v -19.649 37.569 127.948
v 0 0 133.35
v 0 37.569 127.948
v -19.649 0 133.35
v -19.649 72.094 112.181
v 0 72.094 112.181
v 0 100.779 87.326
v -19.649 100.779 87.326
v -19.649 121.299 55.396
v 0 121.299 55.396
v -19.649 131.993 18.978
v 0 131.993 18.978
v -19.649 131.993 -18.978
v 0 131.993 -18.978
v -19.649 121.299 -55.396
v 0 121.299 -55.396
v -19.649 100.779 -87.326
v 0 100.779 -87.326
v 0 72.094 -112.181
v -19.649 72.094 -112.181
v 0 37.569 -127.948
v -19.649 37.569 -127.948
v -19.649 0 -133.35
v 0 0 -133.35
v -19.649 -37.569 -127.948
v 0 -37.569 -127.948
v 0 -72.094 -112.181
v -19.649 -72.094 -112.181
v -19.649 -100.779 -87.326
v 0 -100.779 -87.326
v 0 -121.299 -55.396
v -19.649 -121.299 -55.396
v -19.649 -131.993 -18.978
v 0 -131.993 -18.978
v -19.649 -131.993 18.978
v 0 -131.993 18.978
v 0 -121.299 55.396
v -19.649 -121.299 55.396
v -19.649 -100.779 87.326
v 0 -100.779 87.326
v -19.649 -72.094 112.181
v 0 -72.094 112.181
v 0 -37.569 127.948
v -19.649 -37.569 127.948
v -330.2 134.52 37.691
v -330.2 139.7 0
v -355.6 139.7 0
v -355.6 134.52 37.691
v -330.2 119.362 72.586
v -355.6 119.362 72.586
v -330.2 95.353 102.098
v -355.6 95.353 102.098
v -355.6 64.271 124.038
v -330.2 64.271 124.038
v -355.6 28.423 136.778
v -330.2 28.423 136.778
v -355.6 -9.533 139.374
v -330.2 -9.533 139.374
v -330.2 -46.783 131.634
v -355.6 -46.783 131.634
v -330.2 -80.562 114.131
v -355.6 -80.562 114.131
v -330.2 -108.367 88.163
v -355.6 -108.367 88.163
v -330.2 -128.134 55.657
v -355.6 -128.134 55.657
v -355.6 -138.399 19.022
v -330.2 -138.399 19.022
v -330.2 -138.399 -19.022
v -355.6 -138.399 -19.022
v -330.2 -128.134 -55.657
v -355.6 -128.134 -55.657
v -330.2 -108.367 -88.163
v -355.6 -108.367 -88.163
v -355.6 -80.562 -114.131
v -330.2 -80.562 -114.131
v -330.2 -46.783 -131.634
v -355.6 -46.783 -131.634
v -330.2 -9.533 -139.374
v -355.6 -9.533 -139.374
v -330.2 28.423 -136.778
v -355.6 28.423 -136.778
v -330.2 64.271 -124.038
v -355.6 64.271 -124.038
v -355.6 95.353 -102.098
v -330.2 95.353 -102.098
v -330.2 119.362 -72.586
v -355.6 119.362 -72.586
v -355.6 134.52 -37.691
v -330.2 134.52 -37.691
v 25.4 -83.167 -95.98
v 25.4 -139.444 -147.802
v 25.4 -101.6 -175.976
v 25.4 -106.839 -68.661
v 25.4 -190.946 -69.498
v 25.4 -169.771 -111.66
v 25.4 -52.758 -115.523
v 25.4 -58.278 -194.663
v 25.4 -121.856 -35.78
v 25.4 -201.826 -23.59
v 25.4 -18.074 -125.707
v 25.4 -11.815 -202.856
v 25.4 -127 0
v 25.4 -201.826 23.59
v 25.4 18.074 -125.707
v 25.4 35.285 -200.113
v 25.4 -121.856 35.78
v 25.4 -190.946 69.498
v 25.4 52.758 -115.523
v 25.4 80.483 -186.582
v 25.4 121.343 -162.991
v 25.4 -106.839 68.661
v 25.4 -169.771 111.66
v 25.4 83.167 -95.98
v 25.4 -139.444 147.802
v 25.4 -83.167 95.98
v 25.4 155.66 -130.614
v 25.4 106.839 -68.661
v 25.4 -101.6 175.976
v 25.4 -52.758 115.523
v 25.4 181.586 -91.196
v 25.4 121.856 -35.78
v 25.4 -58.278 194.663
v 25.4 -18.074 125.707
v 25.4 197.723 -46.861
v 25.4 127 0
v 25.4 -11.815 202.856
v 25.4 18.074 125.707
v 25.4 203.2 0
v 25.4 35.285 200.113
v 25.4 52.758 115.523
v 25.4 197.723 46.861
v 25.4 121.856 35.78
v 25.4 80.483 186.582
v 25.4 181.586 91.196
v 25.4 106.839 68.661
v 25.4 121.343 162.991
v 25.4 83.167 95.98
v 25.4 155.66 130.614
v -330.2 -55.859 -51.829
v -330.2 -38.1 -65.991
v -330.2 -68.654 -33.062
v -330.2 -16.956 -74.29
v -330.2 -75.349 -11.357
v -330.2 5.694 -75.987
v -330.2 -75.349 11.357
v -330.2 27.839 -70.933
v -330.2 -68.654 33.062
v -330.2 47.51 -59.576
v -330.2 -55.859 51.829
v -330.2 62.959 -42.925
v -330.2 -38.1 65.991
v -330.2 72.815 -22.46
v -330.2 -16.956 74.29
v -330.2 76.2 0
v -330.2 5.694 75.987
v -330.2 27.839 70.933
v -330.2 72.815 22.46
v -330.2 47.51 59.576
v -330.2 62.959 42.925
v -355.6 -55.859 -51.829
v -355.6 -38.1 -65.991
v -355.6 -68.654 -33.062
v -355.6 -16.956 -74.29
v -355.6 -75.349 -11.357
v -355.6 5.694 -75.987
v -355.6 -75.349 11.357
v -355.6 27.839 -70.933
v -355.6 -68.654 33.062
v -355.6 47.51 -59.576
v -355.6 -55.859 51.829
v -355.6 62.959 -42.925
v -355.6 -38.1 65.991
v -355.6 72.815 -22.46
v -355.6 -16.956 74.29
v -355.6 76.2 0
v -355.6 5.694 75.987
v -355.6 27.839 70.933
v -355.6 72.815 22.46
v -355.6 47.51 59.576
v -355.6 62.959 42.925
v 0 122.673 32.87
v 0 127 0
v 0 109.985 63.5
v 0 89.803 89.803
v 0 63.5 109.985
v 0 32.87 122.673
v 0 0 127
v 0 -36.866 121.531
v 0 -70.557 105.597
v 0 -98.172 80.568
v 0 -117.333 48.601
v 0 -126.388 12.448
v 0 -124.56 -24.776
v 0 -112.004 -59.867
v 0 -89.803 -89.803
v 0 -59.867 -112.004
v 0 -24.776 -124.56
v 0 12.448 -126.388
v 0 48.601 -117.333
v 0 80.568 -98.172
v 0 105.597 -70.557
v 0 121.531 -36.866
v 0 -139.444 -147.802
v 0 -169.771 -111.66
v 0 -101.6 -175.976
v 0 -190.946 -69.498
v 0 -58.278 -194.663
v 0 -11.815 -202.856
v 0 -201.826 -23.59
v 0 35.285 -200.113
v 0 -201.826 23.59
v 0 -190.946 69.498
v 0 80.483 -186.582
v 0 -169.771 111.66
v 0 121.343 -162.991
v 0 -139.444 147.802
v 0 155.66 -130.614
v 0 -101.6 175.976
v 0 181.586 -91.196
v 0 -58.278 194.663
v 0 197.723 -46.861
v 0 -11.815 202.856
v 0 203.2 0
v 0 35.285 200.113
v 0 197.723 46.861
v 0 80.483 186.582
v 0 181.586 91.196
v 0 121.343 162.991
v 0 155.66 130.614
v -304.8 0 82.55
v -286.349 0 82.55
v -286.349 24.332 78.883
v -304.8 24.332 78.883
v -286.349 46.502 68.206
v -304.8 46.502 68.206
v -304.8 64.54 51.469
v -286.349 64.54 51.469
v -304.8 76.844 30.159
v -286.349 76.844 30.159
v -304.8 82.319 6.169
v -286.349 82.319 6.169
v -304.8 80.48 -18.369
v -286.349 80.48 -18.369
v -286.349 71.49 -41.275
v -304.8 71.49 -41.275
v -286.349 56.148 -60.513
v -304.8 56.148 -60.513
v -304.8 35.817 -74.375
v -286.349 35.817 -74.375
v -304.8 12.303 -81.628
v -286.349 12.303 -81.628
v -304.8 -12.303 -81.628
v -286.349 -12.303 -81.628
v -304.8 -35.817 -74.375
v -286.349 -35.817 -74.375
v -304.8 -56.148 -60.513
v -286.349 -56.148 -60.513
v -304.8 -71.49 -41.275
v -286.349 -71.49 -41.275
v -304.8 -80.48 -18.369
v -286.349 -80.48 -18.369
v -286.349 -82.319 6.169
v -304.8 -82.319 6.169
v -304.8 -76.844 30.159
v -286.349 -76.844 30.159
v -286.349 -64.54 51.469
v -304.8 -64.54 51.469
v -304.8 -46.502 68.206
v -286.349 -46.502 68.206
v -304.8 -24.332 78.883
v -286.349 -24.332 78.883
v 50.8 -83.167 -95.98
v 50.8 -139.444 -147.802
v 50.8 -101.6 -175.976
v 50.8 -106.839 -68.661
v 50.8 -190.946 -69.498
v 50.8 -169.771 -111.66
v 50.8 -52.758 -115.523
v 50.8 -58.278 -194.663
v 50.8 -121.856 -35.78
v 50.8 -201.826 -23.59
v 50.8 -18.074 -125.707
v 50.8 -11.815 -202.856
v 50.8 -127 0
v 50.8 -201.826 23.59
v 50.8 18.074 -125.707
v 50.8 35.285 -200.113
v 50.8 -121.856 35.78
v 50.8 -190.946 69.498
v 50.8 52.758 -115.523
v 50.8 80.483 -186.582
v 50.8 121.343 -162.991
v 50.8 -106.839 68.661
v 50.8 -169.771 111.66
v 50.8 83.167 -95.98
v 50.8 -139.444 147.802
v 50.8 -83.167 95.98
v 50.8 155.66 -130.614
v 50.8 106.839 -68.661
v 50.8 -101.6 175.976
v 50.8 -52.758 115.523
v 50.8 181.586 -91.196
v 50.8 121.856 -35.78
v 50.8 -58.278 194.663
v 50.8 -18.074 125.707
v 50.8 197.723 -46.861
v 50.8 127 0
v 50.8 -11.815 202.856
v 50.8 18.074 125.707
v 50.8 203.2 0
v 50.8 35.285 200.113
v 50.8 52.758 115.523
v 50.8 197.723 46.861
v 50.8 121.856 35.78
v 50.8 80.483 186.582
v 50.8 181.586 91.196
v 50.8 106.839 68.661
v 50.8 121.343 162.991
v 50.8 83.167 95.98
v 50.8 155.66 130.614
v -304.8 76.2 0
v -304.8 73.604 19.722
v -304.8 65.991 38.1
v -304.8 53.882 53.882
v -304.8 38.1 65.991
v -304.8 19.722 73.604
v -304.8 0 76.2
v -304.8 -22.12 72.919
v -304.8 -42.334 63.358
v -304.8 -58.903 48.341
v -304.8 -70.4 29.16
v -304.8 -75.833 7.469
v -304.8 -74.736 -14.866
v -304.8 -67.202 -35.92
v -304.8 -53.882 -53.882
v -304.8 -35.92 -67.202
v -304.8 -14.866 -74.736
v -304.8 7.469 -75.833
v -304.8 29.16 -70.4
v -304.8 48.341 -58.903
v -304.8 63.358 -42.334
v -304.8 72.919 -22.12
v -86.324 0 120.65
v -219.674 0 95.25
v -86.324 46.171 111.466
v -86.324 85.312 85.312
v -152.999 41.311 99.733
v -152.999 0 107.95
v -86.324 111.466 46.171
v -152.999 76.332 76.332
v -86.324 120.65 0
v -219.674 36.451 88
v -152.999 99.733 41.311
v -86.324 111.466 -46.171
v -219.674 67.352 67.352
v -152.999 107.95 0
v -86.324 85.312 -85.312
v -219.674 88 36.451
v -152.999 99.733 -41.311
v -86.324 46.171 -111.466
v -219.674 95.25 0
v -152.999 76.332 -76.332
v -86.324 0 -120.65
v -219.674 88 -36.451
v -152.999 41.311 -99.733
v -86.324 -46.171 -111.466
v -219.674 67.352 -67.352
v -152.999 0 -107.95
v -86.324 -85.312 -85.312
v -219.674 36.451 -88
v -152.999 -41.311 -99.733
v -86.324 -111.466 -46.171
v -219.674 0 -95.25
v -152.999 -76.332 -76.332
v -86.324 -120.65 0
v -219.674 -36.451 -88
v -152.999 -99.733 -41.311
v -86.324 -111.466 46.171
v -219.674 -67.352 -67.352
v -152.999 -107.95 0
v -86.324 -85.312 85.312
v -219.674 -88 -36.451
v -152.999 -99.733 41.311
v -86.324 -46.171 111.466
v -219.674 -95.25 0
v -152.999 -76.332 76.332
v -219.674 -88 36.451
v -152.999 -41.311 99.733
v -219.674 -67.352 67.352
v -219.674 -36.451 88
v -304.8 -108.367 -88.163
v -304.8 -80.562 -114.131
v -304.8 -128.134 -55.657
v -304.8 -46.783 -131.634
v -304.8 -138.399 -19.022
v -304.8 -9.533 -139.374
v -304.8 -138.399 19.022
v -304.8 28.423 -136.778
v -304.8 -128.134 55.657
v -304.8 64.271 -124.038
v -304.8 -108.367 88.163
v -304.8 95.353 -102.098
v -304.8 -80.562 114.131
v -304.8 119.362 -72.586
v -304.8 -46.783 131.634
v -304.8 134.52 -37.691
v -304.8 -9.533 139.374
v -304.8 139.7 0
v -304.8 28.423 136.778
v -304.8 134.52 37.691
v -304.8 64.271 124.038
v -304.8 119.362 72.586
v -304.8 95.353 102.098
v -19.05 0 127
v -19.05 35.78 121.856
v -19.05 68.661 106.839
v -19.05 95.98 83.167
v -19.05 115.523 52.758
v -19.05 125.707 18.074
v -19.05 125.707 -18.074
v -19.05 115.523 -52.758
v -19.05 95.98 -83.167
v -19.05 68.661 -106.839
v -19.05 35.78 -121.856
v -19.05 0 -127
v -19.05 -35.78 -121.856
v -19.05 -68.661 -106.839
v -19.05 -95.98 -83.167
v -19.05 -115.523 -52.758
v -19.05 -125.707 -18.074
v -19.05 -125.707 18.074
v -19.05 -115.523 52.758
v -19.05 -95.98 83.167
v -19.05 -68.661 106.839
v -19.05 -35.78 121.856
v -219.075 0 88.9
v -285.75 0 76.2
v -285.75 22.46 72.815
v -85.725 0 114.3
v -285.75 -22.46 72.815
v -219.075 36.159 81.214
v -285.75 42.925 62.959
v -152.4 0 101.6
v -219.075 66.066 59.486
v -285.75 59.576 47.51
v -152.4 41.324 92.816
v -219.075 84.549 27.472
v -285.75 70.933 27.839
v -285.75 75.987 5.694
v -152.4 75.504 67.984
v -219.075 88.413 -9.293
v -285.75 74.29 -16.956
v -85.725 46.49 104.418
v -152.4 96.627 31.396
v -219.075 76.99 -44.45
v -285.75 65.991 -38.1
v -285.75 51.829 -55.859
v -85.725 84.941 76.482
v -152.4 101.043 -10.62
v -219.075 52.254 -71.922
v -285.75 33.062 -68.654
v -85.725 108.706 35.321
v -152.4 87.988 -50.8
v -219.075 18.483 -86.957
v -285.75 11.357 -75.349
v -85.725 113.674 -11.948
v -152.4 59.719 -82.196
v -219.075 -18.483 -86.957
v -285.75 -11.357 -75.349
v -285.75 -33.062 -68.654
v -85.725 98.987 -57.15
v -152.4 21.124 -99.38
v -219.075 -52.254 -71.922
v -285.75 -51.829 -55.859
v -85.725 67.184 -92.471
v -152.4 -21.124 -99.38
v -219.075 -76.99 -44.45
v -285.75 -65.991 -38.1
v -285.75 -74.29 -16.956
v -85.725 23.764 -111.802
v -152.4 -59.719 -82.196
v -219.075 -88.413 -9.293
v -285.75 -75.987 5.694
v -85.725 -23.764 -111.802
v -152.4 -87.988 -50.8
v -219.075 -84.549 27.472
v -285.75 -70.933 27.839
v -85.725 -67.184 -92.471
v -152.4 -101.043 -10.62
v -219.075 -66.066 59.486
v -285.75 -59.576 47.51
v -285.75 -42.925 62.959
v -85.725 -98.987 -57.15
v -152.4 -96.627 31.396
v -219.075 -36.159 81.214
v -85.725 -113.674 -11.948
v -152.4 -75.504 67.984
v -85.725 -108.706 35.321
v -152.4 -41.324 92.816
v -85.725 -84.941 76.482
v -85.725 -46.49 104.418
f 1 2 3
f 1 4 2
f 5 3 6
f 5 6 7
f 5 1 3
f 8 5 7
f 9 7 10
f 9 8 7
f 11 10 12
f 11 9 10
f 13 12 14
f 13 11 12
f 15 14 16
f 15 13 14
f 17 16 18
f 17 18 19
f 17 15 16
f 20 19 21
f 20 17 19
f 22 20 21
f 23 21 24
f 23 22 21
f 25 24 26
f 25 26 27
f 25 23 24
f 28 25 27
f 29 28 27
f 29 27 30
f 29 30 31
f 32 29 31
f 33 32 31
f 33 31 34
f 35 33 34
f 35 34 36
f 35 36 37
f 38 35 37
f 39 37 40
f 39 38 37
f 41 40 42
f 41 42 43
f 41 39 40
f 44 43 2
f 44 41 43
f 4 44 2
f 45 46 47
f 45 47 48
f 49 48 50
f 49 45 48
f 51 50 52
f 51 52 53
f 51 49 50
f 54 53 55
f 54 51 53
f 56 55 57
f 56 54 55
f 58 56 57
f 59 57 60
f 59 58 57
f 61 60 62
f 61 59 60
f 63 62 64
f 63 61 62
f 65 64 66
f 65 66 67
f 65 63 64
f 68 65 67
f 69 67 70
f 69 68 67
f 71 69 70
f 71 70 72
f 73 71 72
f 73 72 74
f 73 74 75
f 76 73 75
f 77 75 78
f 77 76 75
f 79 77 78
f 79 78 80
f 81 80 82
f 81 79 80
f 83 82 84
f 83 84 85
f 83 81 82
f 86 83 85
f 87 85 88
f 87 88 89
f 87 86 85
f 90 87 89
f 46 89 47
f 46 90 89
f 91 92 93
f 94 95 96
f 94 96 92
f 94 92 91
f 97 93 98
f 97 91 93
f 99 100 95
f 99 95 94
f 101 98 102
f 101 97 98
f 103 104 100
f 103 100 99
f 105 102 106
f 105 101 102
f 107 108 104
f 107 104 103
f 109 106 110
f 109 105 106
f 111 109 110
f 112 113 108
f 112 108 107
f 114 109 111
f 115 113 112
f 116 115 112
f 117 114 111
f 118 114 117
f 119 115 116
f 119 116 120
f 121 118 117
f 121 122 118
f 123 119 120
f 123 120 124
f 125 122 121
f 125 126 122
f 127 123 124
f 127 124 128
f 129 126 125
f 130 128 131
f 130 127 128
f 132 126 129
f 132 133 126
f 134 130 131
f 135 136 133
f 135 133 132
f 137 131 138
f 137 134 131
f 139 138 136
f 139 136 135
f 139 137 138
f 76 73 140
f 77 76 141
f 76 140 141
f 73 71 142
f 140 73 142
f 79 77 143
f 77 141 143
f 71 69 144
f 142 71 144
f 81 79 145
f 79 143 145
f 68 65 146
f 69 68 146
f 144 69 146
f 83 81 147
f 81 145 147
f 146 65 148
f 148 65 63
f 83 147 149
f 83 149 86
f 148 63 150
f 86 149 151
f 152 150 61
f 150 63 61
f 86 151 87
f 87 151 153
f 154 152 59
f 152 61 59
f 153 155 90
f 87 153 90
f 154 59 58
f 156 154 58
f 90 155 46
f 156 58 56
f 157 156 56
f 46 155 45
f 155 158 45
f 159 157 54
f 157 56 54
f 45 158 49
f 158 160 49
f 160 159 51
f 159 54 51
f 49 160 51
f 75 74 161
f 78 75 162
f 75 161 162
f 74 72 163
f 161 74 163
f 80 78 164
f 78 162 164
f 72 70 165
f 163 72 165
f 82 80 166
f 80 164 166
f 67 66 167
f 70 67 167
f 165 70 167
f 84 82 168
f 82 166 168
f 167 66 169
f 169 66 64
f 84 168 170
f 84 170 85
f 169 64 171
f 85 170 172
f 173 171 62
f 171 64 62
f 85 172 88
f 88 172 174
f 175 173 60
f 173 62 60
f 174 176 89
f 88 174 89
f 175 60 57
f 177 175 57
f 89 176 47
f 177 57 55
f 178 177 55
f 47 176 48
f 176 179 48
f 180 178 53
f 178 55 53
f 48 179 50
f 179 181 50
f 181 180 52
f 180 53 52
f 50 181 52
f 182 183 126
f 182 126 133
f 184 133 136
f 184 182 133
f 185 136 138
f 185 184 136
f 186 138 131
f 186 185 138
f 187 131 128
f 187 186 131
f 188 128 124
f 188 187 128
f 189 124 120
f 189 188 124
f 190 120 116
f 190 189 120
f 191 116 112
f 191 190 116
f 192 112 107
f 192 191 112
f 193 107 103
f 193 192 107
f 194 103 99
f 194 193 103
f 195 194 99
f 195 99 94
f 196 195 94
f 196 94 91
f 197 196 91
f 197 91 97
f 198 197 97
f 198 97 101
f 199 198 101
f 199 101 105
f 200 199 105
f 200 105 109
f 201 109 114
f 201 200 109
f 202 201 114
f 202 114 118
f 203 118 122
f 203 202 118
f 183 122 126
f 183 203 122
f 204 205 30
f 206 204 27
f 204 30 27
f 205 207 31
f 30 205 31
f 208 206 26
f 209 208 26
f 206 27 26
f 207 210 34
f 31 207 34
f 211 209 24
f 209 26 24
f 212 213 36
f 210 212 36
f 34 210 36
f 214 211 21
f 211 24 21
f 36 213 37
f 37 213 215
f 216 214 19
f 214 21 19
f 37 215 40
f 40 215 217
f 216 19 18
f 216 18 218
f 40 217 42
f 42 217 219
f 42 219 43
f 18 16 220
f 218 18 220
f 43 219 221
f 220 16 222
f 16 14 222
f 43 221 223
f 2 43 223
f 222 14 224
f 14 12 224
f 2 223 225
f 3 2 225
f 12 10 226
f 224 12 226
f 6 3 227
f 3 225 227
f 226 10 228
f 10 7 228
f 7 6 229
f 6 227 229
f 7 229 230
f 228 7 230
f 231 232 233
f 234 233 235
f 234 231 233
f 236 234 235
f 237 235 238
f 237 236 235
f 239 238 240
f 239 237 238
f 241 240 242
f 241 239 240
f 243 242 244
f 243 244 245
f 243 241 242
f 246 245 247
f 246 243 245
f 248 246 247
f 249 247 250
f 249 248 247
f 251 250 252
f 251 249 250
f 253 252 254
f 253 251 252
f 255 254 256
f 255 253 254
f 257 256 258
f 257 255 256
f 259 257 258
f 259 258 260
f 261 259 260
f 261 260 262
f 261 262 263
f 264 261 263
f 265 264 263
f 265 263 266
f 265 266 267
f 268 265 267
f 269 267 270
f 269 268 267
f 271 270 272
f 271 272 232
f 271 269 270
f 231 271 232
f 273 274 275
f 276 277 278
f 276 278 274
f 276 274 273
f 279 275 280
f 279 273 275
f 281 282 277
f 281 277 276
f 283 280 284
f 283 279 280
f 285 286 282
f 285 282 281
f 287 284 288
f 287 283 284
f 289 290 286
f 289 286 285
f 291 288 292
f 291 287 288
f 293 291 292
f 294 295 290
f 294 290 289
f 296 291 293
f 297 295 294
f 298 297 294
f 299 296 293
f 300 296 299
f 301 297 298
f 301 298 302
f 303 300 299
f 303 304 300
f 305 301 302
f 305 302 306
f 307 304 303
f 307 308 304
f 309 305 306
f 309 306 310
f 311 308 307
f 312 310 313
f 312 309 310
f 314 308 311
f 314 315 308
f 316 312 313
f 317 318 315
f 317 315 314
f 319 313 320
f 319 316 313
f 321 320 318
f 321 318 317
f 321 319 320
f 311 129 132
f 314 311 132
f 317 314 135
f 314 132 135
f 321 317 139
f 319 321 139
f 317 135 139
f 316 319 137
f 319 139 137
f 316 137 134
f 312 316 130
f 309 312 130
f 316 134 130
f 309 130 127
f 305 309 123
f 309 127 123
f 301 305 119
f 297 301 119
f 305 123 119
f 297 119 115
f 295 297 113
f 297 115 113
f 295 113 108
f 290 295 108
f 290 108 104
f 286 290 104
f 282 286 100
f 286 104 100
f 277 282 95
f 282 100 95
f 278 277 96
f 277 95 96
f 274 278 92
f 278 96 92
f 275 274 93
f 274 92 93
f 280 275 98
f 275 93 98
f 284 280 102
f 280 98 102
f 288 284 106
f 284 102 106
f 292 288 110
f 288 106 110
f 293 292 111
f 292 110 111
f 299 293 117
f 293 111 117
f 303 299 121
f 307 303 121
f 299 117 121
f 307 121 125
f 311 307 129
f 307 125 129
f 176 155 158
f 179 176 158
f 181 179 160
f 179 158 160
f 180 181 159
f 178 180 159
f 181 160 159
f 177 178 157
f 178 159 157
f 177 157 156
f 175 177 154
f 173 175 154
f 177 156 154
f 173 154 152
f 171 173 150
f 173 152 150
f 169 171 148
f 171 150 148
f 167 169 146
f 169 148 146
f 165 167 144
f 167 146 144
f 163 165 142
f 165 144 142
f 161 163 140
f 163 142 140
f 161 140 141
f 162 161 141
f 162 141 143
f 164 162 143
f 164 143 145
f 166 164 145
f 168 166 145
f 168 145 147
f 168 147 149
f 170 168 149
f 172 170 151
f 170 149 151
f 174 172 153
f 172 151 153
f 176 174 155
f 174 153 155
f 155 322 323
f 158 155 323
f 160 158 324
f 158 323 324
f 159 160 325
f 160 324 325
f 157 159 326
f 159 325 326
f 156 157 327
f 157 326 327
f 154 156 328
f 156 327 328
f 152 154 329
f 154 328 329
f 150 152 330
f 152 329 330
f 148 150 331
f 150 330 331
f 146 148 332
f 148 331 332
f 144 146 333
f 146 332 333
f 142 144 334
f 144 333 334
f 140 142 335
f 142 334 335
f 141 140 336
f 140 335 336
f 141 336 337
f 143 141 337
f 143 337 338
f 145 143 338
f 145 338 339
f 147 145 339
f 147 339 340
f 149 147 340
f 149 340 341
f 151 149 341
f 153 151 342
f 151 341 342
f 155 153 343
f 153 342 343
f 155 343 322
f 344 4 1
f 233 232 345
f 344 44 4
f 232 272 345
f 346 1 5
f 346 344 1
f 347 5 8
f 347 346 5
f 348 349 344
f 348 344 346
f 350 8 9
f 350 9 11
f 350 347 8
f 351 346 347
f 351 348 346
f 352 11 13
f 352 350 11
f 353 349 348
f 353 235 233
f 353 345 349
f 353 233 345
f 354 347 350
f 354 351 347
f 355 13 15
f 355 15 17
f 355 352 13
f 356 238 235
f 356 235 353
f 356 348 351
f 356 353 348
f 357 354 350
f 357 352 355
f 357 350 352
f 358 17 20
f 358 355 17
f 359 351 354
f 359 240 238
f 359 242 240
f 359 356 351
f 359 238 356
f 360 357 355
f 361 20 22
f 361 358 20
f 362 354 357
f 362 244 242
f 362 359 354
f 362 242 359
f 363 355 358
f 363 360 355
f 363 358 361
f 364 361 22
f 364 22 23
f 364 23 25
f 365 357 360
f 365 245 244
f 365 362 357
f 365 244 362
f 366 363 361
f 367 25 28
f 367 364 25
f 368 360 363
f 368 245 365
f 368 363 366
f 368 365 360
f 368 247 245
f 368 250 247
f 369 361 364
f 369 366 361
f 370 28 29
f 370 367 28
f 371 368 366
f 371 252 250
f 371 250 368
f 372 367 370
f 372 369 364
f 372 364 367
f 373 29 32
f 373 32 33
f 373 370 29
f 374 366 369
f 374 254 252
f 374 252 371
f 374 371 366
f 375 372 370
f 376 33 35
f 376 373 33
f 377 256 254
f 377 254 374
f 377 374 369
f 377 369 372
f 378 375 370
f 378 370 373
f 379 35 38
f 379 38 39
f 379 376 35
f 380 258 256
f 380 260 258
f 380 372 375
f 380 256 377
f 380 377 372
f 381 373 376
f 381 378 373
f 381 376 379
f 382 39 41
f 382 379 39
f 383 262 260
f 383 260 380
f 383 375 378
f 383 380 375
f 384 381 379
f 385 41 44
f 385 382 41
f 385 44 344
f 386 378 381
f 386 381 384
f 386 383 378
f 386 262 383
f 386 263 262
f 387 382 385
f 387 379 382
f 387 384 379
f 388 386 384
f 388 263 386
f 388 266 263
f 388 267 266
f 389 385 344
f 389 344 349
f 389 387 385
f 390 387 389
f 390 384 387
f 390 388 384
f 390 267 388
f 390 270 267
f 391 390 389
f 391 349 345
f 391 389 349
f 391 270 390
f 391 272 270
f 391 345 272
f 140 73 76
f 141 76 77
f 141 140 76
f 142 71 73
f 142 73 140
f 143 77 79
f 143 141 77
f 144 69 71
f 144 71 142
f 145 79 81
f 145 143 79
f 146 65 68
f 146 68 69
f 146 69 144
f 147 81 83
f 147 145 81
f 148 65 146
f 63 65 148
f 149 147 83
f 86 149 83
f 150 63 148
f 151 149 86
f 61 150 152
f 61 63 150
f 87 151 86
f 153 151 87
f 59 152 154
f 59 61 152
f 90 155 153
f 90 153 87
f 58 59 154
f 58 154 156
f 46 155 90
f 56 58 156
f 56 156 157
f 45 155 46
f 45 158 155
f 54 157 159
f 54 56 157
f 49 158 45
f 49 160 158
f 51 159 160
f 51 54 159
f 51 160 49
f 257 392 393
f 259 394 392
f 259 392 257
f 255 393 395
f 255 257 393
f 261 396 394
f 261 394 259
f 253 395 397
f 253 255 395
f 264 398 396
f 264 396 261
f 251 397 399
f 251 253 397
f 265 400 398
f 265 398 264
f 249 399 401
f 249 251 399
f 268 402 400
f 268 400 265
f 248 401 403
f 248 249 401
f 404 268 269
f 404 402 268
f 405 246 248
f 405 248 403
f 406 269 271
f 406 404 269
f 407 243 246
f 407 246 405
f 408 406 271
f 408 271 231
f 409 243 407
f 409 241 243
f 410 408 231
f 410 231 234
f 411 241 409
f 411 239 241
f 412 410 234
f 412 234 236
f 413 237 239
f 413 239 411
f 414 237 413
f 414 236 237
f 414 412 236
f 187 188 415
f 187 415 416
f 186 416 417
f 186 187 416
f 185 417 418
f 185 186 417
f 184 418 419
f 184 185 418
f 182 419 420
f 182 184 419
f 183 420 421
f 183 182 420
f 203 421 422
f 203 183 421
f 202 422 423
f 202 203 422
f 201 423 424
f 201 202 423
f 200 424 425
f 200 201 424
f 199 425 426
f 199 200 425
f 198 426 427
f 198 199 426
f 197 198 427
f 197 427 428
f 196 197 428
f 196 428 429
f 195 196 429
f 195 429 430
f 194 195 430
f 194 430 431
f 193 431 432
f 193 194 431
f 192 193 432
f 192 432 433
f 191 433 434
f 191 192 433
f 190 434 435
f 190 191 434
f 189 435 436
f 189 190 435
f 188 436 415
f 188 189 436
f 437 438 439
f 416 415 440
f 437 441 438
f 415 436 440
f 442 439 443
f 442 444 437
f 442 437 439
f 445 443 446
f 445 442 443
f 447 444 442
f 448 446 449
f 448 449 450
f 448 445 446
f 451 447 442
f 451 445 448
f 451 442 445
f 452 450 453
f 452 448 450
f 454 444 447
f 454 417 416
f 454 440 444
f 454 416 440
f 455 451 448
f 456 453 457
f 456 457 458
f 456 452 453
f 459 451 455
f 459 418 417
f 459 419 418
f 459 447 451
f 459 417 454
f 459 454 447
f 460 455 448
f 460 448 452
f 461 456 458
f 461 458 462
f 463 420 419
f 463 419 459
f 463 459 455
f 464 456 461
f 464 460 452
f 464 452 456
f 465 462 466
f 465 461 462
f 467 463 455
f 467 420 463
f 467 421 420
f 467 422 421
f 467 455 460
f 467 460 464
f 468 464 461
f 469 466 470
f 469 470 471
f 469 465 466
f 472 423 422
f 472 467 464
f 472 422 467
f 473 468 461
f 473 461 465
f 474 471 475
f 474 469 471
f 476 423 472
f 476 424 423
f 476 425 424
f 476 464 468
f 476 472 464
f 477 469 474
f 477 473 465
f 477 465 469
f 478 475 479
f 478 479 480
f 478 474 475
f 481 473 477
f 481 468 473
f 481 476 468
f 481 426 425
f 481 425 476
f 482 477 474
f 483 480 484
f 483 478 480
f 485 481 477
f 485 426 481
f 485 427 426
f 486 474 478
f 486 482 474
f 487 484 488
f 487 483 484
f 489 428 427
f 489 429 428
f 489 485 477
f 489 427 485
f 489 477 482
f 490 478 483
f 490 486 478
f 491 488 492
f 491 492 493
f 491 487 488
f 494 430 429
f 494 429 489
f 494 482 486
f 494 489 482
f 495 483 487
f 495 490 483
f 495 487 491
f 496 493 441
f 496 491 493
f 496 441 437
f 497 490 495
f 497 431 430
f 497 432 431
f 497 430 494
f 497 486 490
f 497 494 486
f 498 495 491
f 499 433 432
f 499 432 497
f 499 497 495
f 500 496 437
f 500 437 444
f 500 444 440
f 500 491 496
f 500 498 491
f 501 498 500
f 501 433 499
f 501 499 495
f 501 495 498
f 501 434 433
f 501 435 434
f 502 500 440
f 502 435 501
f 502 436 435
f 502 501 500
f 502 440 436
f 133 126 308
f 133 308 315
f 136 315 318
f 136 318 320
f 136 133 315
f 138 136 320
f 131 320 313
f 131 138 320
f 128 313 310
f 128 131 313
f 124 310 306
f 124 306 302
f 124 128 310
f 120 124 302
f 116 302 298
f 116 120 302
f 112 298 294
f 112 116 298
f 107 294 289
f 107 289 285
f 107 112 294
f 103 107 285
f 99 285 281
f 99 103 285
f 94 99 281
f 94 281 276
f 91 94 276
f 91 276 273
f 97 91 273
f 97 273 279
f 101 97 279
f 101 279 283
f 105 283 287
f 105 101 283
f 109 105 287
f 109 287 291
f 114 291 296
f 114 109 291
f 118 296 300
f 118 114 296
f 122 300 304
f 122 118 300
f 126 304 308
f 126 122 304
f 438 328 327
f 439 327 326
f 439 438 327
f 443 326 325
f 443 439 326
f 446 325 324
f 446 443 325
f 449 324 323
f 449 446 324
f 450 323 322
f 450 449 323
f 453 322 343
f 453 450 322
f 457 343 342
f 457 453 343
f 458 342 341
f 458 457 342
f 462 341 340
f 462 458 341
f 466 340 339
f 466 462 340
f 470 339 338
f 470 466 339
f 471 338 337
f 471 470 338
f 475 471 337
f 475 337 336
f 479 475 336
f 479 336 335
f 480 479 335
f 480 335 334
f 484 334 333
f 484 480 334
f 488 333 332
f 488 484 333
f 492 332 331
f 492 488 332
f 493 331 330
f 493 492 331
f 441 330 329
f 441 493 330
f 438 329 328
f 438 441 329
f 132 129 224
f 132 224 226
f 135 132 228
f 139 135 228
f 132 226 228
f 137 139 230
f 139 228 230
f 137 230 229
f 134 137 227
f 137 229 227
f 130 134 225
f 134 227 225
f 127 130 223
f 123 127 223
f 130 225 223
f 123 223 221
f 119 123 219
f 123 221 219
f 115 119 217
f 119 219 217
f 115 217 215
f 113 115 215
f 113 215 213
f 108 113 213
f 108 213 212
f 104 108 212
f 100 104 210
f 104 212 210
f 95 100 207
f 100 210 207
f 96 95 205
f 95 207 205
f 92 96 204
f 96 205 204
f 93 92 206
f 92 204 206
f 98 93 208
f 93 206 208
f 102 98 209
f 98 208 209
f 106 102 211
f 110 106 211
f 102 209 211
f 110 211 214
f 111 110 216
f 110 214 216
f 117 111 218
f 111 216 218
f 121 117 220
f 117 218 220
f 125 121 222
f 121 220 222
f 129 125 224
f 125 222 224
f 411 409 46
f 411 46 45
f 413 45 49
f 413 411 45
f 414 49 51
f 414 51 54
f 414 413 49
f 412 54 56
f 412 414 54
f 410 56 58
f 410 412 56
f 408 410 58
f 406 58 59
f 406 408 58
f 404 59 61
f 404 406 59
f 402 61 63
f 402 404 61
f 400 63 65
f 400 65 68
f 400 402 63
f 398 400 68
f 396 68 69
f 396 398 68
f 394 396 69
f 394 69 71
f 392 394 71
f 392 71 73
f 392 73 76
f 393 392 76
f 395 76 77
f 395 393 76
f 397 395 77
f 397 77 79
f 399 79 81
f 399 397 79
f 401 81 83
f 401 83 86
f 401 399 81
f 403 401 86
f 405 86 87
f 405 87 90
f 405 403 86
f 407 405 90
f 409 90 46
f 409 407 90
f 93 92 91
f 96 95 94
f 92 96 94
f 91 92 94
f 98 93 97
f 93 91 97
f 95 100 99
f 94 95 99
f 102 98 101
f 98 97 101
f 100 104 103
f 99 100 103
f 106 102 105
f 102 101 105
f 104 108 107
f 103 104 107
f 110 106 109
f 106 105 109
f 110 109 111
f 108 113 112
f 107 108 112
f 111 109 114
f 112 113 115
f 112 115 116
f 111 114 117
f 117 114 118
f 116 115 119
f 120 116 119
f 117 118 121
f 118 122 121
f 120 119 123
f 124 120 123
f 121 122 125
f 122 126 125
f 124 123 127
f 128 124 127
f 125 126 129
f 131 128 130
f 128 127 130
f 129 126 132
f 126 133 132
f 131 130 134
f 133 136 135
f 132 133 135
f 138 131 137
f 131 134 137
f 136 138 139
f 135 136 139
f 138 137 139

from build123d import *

# Parameters (mm, degrees)
F0_R      = 203.2
F0_R_2    = 127
F1_DEPTH  = 25.4
F3_R      = 139.7
F3_R_2    = 76.2
F4_DEPTH  = 25.4
F9_DEPTH  = 25.4
F10_DEPTH = 25.4


with BuildPart() as f1:
    # F0 (on Right) → F1 (new body)
    with BuildSketch(Plane.YZ):
        Circle(F0_R)
        Circle(F0_R_2, mode=Mode.SUBTRACT)
    extrude(amount=F1_DEPTH)



with BuildPart() as f4:
    # F3 (on offset) → F4 (new body)
    with BuildSketch(Plane.YZ.offset(-304.8)):
        Circle(F3_R)
        Circle(F3_R_2, mode=Mode.SUBTRACT)
    extrude(amount=-F4_DEPTH)


with BuildPart() as f1_1:
    add(f1.part)

    add(f4.part)  # F8 merges F4
    # F7 (on Front) → F8 (revolve)
    with BuildSketch(Plane.XZ):
        Polygon((-304.8, 82.55), (-304.8, 76.2), (-285.75, 76.2), (-19.05, 127), (0, 127), (0, 133.35), (-19.6493738432, 133.35), (-286.3493738432, 82.55), align=None)
    revolve(axis=Axis((-150.1979082823, 0, 0), (-1, 0, 0)))


with BuildPart() as f9:
    # F9 (new): a face of the model
    f9_faces = [f1_1.part.faces().sort_by_distance(p)[0] for p in [
        (-330.2, -135.7486873067, 0),
    ]]
    extrude(f9_faces, amount=F9_DEPTH)


with BuildPart() as f10:
    # F10 (new): a face of the model
    f10_faces = [f1_1.part.faces().sort_by_distance(p)[0] for p in [
        (25.4, -197.4526360825, 0),
    ]]
    extrude(f10_faces, amount=F10_DEPTH)


solid = Compound([f1_1.part, f9.part, f10.part])
